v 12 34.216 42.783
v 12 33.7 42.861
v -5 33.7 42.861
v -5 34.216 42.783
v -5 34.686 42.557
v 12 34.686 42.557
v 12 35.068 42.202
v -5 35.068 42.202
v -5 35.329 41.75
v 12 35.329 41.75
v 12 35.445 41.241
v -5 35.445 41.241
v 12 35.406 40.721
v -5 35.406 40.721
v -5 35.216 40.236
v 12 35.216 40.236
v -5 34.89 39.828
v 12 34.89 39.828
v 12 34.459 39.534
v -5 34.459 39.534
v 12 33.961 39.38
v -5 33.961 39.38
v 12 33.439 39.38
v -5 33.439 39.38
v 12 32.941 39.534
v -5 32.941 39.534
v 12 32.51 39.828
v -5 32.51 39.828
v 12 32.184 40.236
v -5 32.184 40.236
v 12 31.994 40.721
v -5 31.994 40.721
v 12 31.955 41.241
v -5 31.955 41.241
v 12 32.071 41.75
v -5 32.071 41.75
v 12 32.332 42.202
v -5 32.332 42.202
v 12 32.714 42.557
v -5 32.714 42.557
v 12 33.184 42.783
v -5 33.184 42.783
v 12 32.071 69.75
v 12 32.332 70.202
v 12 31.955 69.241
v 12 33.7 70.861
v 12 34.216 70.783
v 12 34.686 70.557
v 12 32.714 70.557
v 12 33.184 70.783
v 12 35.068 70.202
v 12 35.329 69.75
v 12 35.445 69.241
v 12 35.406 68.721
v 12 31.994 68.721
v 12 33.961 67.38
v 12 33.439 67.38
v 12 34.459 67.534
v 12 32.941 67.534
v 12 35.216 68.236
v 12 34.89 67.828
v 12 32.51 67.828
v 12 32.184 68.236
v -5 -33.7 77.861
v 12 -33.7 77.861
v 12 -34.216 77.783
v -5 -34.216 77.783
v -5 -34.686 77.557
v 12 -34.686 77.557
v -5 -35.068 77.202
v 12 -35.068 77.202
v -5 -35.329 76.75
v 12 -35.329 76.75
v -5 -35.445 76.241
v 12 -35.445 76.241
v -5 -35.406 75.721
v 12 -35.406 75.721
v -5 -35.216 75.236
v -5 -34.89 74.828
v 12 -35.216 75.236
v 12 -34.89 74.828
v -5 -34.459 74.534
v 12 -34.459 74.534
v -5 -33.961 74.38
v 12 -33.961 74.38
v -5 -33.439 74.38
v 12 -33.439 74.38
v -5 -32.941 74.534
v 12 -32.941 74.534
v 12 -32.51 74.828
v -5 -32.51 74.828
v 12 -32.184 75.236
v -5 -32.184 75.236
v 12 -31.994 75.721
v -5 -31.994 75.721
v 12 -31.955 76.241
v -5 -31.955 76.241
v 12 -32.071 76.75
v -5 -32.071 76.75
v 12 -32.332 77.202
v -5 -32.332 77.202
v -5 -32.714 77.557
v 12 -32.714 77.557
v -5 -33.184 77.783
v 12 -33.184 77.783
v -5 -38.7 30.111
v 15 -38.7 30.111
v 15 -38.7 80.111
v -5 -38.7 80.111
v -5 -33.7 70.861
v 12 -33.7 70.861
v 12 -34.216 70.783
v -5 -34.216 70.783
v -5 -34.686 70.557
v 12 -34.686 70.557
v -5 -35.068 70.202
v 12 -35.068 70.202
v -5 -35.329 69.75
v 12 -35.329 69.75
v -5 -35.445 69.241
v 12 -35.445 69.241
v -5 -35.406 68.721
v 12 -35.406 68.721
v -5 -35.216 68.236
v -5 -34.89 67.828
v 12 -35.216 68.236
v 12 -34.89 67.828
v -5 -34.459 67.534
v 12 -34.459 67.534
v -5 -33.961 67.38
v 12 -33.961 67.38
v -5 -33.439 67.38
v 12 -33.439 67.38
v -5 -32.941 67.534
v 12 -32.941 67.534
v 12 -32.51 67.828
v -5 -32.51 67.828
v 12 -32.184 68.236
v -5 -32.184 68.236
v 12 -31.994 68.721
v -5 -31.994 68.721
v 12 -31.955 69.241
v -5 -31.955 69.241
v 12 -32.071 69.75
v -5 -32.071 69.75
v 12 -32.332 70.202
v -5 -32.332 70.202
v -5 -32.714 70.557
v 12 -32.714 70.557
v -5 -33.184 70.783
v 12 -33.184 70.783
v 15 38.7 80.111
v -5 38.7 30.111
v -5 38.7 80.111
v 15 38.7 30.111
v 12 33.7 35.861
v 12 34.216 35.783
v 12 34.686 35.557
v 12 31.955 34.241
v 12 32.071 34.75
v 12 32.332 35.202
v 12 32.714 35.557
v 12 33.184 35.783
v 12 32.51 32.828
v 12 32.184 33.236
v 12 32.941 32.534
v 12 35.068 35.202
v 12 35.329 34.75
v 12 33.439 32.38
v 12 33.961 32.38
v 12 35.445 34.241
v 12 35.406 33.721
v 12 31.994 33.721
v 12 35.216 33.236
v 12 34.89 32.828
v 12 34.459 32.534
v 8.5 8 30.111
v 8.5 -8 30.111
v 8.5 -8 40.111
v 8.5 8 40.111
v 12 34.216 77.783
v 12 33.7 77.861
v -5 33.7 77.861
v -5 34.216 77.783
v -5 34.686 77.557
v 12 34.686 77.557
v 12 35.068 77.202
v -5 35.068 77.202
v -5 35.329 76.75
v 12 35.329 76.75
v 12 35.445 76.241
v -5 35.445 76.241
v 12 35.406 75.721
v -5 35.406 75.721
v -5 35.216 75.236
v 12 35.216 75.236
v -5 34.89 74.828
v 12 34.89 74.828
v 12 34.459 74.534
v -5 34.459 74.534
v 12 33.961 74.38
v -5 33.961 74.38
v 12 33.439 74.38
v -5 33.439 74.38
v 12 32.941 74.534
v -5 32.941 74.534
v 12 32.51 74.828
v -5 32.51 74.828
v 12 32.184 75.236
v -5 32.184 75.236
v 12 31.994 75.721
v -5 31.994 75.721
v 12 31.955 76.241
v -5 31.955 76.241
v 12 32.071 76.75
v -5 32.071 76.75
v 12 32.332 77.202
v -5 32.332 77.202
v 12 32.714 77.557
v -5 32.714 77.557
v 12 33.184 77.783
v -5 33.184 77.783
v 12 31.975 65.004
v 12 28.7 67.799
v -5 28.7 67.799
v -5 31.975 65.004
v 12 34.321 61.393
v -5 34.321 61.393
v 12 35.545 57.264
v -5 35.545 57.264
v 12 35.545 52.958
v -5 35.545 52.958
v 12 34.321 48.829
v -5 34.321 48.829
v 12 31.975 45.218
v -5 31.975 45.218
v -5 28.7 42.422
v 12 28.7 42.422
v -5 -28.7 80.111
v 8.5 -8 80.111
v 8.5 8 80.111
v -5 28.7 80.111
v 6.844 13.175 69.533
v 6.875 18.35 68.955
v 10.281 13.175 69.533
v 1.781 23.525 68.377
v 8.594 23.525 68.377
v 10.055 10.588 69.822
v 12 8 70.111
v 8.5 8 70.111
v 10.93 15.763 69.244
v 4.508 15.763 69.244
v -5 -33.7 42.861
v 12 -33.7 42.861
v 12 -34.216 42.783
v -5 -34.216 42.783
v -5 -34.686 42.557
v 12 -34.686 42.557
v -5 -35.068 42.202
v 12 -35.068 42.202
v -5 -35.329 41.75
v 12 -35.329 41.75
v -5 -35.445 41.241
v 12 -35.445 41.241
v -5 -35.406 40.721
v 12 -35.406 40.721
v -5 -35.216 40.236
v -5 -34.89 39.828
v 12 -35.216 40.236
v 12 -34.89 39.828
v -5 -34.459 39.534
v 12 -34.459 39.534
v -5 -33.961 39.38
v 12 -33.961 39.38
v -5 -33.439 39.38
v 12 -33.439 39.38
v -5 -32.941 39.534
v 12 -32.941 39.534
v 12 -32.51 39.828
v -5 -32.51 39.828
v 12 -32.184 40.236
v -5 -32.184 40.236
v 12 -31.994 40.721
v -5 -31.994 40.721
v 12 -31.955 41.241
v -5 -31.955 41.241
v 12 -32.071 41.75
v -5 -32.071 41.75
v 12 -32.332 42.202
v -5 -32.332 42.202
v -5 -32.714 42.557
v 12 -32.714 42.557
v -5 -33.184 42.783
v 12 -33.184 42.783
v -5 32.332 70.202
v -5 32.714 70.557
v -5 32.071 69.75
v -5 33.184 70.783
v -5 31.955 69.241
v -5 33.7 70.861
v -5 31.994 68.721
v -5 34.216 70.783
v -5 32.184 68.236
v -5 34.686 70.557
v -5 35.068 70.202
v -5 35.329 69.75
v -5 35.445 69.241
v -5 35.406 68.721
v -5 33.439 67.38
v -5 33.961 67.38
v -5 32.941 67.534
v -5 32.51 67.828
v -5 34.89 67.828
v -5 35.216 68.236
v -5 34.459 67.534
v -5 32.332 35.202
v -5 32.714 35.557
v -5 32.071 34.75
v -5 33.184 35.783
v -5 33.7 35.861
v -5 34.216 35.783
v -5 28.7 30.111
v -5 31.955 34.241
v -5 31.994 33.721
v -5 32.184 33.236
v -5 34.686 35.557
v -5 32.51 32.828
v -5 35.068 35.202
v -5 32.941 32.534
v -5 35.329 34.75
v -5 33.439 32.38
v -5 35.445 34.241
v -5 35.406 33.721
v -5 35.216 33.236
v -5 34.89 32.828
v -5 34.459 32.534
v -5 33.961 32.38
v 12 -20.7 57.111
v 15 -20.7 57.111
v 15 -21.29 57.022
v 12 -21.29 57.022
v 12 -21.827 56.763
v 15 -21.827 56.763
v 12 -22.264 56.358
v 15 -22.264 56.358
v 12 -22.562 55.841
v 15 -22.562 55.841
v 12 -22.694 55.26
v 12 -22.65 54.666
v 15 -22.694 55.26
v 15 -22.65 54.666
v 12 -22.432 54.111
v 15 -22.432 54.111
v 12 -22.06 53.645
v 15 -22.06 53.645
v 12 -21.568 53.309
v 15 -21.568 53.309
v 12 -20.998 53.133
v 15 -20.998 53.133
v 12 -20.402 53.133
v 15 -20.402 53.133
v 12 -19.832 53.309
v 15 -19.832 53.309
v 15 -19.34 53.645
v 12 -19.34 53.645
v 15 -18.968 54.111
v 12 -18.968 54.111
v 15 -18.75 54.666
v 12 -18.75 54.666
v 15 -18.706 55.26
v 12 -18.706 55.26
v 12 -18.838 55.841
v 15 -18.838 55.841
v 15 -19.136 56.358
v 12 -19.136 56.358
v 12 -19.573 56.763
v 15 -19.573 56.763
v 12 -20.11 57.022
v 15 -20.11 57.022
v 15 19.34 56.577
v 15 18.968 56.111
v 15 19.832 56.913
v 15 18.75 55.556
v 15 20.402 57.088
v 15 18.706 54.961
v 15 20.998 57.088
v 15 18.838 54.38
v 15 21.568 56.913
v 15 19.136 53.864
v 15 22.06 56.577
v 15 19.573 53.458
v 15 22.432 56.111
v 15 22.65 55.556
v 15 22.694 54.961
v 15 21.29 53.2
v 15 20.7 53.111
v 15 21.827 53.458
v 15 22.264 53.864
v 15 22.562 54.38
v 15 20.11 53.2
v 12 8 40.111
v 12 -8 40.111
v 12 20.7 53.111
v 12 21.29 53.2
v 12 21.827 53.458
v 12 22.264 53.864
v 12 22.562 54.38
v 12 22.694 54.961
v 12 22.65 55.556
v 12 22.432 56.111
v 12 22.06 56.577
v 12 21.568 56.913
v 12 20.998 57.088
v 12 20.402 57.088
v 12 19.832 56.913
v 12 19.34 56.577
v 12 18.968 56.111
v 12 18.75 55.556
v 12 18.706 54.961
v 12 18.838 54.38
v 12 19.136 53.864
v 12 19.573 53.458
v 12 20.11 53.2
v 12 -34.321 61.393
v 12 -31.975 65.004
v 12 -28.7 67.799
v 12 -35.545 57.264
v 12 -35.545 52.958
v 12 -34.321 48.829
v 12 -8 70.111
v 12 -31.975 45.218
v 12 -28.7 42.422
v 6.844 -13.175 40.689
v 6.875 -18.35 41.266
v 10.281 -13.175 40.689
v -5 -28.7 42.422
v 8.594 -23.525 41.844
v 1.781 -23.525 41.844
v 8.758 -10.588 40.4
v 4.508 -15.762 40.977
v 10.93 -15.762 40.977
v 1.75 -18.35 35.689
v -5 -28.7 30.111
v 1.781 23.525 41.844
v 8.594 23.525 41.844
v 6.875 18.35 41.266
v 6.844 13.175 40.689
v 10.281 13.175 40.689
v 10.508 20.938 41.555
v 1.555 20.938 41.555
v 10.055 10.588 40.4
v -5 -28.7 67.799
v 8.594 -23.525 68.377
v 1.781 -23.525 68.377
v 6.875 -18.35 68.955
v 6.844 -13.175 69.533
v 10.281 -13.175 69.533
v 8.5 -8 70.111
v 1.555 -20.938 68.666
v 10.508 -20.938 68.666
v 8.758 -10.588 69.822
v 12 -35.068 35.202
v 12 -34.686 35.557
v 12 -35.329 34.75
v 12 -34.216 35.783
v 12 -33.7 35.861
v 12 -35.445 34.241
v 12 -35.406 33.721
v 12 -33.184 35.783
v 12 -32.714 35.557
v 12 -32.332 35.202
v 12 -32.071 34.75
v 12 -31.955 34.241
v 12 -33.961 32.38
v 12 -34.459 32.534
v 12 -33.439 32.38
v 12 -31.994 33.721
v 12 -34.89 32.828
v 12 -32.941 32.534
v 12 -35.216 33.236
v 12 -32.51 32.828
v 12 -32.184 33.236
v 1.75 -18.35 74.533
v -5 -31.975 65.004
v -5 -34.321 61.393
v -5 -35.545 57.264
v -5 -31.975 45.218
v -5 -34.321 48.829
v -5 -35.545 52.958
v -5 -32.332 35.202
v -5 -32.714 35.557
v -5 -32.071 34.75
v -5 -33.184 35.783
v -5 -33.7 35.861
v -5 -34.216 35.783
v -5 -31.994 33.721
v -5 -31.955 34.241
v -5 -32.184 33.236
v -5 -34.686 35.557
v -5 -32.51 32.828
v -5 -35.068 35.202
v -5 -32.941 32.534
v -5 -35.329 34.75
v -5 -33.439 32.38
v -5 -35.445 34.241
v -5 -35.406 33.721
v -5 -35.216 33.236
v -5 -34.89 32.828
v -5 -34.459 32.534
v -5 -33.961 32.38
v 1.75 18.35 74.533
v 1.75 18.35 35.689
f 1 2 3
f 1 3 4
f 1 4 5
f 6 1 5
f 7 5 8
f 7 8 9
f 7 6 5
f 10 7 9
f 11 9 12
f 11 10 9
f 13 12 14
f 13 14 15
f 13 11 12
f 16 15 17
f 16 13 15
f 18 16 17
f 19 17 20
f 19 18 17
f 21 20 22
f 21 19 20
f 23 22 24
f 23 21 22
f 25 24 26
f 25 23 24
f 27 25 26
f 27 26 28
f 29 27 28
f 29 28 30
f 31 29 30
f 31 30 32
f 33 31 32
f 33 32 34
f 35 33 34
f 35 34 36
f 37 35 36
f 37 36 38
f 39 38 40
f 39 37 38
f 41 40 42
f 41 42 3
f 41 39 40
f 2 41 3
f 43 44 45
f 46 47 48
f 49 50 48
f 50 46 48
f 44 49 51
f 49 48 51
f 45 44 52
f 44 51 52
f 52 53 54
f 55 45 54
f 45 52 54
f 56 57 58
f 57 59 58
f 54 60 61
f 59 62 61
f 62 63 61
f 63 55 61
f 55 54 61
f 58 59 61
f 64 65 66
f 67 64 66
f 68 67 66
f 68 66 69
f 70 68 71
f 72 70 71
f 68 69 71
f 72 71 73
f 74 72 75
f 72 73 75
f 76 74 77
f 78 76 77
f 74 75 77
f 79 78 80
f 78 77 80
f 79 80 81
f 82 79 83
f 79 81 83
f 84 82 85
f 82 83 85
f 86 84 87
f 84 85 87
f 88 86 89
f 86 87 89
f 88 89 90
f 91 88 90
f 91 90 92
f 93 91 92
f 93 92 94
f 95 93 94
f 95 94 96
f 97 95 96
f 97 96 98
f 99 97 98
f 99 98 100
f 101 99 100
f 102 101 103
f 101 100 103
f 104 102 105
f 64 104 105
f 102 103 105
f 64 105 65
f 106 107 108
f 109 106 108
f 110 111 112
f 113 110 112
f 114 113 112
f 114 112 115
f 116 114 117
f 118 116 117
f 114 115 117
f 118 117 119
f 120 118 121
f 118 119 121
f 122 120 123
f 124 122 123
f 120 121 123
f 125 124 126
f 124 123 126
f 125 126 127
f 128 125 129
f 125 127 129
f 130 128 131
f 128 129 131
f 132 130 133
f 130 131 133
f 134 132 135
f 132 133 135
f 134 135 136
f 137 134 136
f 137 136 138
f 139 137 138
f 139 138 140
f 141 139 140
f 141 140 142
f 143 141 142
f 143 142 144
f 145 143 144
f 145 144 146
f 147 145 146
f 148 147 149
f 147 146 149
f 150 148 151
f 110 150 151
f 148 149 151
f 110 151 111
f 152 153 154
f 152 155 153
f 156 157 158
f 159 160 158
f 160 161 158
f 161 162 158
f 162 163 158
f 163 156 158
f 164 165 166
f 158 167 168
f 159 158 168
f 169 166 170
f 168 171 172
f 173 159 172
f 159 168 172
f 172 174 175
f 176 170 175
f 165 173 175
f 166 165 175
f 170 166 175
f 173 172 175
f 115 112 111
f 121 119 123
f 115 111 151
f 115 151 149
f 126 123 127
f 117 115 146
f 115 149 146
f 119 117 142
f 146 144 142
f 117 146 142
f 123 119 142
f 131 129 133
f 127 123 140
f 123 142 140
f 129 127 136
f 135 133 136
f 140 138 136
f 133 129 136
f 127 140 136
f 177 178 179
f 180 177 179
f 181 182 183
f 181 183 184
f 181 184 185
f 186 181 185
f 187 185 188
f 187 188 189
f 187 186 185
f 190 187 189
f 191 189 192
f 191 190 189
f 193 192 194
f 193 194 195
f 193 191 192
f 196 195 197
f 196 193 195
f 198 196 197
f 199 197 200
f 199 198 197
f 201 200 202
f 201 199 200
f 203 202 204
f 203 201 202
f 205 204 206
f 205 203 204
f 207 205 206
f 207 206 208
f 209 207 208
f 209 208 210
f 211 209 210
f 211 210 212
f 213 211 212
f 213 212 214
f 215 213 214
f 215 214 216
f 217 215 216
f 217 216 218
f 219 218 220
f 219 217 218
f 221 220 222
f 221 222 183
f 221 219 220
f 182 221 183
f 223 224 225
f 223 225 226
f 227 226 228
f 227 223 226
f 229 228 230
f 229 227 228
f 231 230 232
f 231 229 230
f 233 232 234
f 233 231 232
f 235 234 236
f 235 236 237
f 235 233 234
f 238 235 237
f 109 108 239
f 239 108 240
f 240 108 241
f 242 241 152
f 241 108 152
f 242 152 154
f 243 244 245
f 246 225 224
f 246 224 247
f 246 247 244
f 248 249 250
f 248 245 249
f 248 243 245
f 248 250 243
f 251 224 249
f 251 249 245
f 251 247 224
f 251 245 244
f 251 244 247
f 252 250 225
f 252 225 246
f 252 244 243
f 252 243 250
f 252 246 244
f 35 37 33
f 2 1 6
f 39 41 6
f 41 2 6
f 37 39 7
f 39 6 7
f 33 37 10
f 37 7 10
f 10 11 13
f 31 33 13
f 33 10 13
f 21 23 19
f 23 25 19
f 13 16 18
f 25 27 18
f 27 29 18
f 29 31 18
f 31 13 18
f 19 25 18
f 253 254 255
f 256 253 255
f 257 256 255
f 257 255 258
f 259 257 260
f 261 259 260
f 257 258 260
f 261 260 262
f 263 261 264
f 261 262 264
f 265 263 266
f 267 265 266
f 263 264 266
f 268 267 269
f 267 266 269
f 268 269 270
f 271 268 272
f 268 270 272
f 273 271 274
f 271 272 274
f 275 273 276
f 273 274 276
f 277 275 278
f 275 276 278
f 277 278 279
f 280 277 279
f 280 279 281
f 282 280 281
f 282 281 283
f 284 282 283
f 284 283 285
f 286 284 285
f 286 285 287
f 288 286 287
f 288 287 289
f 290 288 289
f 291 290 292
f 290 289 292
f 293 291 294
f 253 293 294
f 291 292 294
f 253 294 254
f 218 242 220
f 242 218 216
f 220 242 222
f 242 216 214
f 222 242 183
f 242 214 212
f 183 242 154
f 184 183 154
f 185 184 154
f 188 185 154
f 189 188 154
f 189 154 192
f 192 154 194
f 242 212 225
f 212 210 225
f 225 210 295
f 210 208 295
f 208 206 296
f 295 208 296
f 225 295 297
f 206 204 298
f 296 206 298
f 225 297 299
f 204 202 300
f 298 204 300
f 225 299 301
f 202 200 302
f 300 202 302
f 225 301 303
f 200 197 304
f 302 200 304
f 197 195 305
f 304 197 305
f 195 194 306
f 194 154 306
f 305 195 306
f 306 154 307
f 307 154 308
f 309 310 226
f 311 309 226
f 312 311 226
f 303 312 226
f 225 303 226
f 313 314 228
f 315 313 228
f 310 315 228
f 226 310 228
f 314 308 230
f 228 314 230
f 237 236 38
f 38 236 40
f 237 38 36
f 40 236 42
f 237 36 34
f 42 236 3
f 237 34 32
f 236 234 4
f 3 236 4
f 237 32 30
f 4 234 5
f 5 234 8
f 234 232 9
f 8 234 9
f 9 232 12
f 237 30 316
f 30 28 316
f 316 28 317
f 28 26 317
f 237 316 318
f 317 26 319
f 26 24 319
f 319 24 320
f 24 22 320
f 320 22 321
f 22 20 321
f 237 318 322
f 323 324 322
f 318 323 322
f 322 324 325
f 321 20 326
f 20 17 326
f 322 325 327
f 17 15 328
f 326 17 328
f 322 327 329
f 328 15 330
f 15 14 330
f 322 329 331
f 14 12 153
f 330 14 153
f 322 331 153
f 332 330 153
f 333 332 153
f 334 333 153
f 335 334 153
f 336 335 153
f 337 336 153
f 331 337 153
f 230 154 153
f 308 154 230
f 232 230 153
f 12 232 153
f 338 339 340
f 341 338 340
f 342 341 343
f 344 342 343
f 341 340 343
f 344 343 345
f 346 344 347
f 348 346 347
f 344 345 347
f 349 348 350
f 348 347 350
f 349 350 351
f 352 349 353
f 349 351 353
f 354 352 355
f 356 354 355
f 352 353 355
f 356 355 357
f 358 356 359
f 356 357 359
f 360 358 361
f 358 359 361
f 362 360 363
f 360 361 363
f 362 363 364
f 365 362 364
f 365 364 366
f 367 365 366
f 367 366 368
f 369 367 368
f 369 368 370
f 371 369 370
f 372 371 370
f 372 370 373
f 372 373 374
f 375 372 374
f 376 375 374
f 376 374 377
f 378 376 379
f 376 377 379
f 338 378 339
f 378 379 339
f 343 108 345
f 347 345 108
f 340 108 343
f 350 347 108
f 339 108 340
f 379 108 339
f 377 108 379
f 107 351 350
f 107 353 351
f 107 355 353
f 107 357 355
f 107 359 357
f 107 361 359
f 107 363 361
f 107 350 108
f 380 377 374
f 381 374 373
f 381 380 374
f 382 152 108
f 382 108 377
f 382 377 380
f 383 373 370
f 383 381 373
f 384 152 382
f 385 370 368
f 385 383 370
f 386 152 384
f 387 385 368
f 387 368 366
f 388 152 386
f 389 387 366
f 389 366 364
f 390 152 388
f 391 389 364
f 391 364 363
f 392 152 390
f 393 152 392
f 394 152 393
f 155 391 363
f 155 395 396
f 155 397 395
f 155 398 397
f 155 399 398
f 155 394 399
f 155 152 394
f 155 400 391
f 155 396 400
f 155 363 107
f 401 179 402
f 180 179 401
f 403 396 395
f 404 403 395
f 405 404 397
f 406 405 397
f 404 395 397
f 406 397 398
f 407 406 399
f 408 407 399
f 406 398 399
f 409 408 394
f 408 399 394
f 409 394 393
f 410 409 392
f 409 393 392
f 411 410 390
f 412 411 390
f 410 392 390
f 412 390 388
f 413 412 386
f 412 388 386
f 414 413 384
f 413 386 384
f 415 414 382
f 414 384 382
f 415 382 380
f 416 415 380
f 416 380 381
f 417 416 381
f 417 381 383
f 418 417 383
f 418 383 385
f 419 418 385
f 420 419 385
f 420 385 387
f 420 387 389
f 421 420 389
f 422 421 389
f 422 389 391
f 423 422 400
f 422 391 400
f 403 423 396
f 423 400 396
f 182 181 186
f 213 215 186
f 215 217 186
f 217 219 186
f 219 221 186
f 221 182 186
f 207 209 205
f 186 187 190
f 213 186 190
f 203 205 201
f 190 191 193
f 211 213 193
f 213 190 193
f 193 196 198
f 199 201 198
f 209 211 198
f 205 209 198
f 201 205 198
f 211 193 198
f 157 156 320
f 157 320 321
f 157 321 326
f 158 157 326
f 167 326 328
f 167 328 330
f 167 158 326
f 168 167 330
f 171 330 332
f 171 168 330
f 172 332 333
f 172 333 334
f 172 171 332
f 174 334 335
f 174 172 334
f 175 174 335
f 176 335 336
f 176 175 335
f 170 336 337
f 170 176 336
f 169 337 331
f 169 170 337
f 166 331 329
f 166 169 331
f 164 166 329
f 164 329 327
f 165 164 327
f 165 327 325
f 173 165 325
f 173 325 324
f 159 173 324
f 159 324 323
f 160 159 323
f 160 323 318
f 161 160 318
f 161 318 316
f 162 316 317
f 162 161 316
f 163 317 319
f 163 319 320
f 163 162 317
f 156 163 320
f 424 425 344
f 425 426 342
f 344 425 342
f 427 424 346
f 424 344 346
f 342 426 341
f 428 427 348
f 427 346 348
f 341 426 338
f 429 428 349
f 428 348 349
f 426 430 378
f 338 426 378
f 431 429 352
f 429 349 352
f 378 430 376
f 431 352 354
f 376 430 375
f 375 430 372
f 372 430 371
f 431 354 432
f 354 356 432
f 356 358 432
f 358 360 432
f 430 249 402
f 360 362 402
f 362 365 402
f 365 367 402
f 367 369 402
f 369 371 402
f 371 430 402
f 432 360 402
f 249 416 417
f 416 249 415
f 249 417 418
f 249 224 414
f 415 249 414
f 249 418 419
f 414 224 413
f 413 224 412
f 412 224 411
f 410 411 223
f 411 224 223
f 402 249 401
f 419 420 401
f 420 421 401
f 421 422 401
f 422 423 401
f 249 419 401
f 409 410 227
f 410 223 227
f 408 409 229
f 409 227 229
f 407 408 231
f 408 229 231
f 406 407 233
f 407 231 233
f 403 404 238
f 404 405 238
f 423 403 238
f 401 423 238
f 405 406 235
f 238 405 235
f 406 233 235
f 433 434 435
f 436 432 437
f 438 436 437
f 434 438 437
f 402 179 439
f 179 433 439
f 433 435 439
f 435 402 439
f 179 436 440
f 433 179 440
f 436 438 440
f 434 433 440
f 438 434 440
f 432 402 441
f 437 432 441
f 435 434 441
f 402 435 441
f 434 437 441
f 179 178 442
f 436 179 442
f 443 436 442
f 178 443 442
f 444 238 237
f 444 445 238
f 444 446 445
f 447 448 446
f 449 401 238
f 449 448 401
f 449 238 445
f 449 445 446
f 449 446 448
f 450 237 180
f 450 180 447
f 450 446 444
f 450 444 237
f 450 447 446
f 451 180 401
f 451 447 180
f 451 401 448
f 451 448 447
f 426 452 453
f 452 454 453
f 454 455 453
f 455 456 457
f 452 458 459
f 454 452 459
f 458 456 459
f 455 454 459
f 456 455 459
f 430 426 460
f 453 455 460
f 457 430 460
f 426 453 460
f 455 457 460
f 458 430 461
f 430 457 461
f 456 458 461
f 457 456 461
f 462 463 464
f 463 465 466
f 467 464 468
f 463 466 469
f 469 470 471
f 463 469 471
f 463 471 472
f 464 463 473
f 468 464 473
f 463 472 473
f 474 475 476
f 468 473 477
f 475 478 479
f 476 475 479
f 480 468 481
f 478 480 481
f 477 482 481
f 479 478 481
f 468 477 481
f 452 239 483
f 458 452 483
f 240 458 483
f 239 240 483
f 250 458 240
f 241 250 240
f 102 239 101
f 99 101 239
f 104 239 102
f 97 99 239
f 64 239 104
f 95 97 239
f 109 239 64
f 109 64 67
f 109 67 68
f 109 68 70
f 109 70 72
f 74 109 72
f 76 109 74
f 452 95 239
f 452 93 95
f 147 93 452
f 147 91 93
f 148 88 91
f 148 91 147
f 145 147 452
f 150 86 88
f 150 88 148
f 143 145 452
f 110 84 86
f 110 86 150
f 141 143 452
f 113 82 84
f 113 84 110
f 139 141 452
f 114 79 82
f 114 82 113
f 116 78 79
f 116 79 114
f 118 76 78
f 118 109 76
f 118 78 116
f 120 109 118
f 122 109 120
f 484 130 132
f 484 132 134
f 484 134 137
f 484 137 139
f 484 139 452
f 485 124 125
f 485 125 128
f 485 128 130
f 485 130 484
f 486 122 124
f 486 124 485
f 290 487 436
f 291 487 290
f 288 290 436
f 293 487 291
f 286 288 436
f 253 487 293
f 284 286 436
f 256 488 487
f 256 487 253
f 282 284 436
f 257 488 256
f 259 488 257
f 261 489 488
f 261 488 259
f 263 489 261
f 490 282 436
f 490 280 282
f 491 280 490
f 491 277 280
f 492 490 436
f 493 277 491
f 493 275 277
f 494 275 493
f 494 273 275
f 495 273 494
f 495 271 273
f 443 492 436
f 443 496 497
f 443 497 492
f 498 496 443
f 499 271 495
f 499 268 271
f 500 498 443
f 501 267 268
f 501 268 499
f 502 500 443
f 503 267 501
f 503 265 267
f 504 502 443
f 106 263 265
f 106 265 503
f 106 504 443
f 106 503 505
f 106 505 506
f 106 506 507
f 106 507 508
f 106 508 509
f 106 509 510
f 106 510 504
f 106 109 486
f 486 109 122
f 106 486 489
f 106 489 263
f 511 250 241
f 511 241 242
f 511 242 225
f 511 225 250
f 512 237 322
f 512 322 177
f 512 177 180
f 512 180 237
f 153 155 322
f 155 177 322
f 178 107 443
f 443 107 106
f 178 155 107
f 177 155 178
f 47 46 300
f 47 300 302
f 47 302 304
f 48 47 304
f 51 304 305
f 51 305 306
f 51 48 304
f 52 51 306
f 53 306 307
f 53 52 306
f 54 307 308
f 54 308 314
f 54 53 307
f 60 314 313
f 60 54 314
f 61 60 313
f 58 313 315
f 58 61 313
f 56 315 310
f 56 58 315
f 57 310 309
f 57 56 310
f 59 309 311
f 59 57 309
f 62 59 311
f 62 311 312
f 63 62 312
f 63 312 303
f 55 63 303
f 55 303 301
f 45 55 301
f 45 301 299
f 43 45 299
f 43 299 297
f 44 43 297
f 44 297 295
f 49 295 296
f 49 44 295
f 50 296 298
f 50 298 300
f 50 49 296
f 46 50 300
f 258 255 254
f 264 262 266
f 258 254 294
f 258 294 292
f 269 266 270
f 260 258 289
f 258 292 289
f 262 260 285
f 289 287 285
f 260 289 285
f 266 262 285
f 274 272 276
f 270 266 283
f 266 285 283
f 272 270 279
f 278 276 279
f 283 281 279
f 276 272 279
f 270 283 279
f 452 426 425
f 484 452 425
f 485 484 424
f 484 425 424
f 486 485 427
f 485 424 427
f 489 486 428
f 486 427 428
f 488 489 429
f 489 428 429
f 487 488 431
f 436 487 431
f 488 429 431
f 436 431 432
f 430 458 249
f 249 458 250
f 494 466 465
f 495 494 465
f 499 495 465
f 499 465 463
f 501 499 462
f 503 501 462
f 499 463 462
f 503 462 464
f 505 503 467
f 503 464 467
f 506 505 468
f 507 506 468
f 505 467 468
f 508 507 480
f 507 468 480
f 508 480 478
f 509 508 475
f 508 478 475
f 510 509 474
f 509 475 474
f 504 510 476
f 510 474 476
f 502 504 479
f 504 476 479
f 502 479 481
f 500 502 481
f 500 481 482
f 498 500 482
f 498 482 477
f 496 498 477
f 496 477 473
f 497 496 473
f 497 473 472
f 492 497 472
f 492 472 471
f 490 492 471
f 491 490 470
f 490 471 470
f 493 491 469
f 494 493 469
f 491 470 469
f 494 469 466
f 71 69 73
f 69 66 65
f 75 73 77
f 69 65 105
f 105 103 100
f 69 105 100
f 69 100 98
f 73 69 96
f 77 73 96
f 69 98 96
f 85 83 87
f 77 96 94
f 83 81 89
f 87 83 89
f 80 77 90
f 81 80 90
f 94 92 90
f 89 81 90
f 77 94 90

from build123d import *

# Parameters (mm, degrees)
SKETCH1_W           = 50
SKETCH1_H           = 77.4
SKETCH1_R           = 2
BOSS_EXTRUDE1_DEPTH = 3
SKETCH2_R           = 1.75
BOSS_EXTRUDE2_DEPTH = 17
SKETCH3_W           = 50
SKETCH3_H           = 16
BOSS_EXTRUDE3_DEPTH = 3.5
SKETCH6_W           = 30
SKETCH6_H           = 16
CUT_EXTRUDE3_DEPTH  = 3.5


with BuildPart() as part:
    # Sketch1 → Boss-Extrude1 (new body)
    with BuildSketch(Plane(origin=(15, 0, 0), x_dir=(0, 0, -1), z_dir=(1, 0, 0))):
        with Locations((-55.110705908, 0)):
            Rectangle(SKETCH1_W, SKETCH1_H)
        with Locations((-55.110705908, 20.7)):
            Circle(SKETCH1_R, mode=Mode.SUBTRACT)
        with Locations(Location((-55.110705908, -20.7, 0), (0, 0, 180))):
            Circle(SKETCH1_R, mode=Mode.SUBTRACT)
    extrude(amount=-BOSS_EXTRUDE1_DEPTH)

    # Sketch2 → Boss-Extrude2 (add)
    with BuildSketch(Plane.ZY.offset(-12)):
        with BuildLine():
            Line((30.110705908, 38.7), (80.110705908, 38.7))
            Line((80.110705908, 38.7), (80.110705908, 28.7))
            Line((80.110705908, 28.7), (67.799283448, 28.7))
            ThreePointArc((67.799283448, 28.7), (55.110705908, 35.7), (42.422128367, 28.7))
            Line((42.422128367, 28.7), (30.110705908, 28.7))
            Line((30.110705908, 28.7), (30.110705908, 38.7))
        make_face()
        with Locations((34.110705908, 33.7)):
            Circle(SKETCH2_R, mode=Mode.SUBTRACT)
        with Locations((41.110705908, 33.7)):
            Circle(SKETCH2_R, mode=Mode.SUBTRACT)
        with Locations((69.110705908, 33.7)):
            Circle(SKETCH2_R, mode=Mode.SUBTRACT)
        with Locations((76.110705908, 33.7)):
            Circle(SKETCH2_R, mode=Mode.SUBTRACT)
    boss_extrude2 = extrude(amount=BOSS_EXTRUDE2_DEPTH)

    # Mirror1: Boss-Extrude2 across plane
    add(boss_extrude2.mirror(Plane.ZX))

    # Sketch3 → Boss-Extrude3 (add)
    with BuildSketch(Plane.ZY.offset(-12)):
        with Locations((55.110705908, 0)):
            Rectangle(SKETCH3_W, SKETCH3_H)
    extrude(amount=BOSS_EXTRUDE3_DEPTH)

    # Sketch6 → Cut-Extrude3 (cut)
    with BuildSketch(Plane.ZY.offset(-8.5)):
        with Locations((55.110705908, 0)):
            Rectangle(SKETCH6_W, SKETCH6_H)
    extrude(amount=-CUT_EXTRUDE3_DEPTH, mode=Mode.SUBTRACT)

    # loft from a face of the part (loft2)
    loft([part.faces().sort_by_distance((3.5, 28.7, 36.266417138))[0], part.faces().sort_by_distance((10.25, 8, 35.110705908))[0]])

    # loft from a face of the part (loft3)
    loft([part.faces().sort_by_distance((10.25, 8, 75.110705908))[0], part.faces().sort_by_distance((3.5, 28.7, 73.954994678))[0]])

    # loft from a face of the part (loft4)
    loft([part.faces().sort_by_distance((10.25, -8, 35.110705908))[0], part.faces().sort_by_distance((3.5, -28.7, 36.266417138))[0]])

    # loft from a face of the part (loft5)
    loft([part.faces().sort_by_distance((3.5, -28.7, 73.954994678))[0], part.faces().sort_by_distance((10.25, -8, 75.110705908))[0]])


solid = part.part
